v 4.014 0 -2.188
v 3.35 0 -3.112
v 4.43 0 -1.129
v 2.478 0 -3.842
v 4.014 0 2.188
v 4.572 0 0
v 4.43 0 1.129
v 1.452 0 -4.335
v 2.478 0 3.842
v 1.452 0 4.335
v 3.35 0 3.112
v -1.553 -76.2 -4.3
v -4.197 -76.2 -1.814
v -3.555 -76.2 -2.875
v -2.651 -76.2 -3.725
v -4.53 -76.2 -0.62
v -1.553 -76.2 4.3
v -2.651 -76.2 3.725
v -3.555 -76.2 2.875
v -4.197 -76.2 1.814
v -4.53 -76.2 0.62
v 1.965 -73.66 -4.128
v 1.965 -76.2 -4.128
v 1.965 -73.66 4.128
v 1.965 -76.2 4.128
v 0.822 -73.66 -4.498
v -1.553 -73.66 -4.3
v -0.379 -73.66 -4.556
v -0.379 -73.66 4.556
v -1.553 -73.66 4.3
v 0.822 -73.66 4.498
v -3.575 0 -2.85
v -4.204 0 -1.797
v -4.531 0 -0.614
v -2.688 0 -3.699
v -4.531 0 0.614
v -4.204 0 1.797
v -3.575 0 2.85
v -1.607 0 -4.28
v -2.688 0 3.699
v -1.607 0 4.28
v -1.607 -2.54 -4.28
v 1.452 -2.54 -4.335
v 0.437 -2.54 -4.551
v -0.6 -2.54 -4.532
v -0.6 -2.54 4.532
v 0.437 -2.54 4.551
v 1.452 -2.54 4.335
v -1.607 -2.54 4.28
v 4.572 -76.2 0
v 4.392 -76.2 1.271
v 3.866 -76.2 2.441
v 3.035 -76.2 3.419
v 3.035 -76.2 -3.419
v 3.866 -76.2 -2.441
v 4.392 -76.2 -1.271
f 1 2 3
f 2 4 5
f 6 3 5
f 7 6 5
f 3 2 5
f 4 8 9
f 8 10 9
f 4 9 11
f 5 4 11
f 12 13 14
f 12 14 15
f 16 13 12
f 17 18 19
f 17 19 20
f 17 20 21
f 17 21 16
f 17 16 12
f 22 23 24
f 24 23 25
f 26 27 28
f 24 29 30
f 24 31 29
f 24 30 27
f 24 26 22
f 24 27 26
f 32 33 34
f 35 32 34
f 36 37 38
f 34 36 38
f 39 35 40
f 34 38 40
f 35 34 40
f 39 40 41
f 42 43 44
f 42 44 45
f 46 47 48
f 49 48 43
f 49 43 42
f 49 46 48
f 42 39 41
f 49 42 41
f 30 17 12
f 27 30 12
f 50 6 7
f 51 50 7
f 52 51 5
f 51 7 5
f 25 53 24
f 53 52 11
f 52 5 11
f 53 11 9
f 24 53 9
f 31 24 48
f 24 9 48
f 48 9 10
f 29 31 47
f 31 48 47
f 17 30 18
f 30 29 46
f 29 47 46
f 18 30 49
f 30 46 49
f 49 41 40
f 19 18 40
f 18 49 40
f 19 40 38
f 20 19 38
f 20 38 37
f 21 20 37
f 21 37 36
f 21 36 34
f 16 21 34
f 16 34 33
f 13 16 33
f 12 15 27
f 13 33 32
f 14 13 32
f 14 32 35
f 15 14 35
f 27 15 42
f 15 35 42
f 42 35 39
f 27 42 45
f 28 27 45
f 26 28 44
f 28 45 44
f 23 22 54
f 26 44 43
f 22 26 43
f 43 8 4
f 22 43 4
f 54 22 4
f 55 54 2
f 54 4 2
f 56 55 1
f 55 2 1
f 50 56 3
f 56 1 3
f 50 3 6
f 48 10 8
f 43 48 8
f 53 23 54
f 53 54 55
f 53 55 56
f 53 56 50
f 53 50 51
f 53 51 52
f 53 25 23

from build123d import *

# Parameters (mm, degrees)
F0_R     = 4.572
F1_DEPTH = 76.2
F3_DEPTH = 2.54
F5_DEPTH = 2.54


with BuildPart() as f1:
    # F0 (on Front) → F1 (new body)
    with BuildSketch(Plane.XZ):
        Circle(F0_R)
    extrude(amount=F1_DEPTH)

    # F2 (on face) → F3 (cut)
    with BuildSketch(Plane.XZ.offset(76.2)):
        with BuildLine():
            Line((1.9650808536, 8.0974539742), (-1.5526660718, 8.0974539742))
            Line((-1.5526660718, 8.0974539742), (-1.5526660718, 4.300280464))
            ThreePointArc((-1.5526660718, 4.300280464), (0.2234468976, 4.5665364867), (1.9650808536, 4.128152279))
            Line((1.9650808536, 4.128152279), (1.9650808536, 8.0974539742))
        make_face()
        with BuildLine():
            ThreePointArc((1.9650808536, -4.128152279), (0.2234468976, -4.5665364867), (-1.5526660718, -4.300280464))
            Line((-1.5526660718, -4.300280464), (-1.5526660718, -7.655933965))
            Line((-1.5526660718, -7.655933965), (1.9650808536, -7.655933965))
            Line((1.9650808536, -7.655933965), (1.9650808536, -4.128152279))
        make_face()
        with BuildLine():
            ThreePointArc((1.9650808536, 4.128152279), (0.2234468976, 4.5665364867), (-1.5526660718, 4.300280464))
            Line((-1.5526660718, 4.300280464), (-1.5526660718, -4.300280464))
            ThreePointArc((-1.5526660718, -4.300280464), (0.2234468976, -4.5665364867), (1.9650808536, -4.128152279))
            Line((1.9650808536, -4.128152279), (1.9650808536, 4.128152279))
        make_face()
    extrude(amount=-F3_DEPTH, mode=Mode.SUBTRACT)

    # F4 (on face) → F5 (cut)
    with BuildSketch(Plane(origin=(0, 0, 0), x_dir=(-1, 0, 0), z_dir=(0, 1, 0))):
        with BuildLine():
            ThreePointArc((1.6067995457, 4.2803480256), (0.082074117, 4.5712632652), (-1.4521116391, 4.3352688253))
            Line((-1.4521116391, 4.3352688253), (-1.4521116391, -4.3352688253))
            ThreePointArc((-1.4521116391, -4.3352688253), (0.082074117, -4.5712632652), (1.6067995457, -4.2803480256))
            Line((1.6067995457, -4.2803480256), (1.6067995457, 4.2803480256))
        make_face()
    extrude(amount=-F5_DEPTH, mode=Mode.SUBTRACT)


solid = f1.part
